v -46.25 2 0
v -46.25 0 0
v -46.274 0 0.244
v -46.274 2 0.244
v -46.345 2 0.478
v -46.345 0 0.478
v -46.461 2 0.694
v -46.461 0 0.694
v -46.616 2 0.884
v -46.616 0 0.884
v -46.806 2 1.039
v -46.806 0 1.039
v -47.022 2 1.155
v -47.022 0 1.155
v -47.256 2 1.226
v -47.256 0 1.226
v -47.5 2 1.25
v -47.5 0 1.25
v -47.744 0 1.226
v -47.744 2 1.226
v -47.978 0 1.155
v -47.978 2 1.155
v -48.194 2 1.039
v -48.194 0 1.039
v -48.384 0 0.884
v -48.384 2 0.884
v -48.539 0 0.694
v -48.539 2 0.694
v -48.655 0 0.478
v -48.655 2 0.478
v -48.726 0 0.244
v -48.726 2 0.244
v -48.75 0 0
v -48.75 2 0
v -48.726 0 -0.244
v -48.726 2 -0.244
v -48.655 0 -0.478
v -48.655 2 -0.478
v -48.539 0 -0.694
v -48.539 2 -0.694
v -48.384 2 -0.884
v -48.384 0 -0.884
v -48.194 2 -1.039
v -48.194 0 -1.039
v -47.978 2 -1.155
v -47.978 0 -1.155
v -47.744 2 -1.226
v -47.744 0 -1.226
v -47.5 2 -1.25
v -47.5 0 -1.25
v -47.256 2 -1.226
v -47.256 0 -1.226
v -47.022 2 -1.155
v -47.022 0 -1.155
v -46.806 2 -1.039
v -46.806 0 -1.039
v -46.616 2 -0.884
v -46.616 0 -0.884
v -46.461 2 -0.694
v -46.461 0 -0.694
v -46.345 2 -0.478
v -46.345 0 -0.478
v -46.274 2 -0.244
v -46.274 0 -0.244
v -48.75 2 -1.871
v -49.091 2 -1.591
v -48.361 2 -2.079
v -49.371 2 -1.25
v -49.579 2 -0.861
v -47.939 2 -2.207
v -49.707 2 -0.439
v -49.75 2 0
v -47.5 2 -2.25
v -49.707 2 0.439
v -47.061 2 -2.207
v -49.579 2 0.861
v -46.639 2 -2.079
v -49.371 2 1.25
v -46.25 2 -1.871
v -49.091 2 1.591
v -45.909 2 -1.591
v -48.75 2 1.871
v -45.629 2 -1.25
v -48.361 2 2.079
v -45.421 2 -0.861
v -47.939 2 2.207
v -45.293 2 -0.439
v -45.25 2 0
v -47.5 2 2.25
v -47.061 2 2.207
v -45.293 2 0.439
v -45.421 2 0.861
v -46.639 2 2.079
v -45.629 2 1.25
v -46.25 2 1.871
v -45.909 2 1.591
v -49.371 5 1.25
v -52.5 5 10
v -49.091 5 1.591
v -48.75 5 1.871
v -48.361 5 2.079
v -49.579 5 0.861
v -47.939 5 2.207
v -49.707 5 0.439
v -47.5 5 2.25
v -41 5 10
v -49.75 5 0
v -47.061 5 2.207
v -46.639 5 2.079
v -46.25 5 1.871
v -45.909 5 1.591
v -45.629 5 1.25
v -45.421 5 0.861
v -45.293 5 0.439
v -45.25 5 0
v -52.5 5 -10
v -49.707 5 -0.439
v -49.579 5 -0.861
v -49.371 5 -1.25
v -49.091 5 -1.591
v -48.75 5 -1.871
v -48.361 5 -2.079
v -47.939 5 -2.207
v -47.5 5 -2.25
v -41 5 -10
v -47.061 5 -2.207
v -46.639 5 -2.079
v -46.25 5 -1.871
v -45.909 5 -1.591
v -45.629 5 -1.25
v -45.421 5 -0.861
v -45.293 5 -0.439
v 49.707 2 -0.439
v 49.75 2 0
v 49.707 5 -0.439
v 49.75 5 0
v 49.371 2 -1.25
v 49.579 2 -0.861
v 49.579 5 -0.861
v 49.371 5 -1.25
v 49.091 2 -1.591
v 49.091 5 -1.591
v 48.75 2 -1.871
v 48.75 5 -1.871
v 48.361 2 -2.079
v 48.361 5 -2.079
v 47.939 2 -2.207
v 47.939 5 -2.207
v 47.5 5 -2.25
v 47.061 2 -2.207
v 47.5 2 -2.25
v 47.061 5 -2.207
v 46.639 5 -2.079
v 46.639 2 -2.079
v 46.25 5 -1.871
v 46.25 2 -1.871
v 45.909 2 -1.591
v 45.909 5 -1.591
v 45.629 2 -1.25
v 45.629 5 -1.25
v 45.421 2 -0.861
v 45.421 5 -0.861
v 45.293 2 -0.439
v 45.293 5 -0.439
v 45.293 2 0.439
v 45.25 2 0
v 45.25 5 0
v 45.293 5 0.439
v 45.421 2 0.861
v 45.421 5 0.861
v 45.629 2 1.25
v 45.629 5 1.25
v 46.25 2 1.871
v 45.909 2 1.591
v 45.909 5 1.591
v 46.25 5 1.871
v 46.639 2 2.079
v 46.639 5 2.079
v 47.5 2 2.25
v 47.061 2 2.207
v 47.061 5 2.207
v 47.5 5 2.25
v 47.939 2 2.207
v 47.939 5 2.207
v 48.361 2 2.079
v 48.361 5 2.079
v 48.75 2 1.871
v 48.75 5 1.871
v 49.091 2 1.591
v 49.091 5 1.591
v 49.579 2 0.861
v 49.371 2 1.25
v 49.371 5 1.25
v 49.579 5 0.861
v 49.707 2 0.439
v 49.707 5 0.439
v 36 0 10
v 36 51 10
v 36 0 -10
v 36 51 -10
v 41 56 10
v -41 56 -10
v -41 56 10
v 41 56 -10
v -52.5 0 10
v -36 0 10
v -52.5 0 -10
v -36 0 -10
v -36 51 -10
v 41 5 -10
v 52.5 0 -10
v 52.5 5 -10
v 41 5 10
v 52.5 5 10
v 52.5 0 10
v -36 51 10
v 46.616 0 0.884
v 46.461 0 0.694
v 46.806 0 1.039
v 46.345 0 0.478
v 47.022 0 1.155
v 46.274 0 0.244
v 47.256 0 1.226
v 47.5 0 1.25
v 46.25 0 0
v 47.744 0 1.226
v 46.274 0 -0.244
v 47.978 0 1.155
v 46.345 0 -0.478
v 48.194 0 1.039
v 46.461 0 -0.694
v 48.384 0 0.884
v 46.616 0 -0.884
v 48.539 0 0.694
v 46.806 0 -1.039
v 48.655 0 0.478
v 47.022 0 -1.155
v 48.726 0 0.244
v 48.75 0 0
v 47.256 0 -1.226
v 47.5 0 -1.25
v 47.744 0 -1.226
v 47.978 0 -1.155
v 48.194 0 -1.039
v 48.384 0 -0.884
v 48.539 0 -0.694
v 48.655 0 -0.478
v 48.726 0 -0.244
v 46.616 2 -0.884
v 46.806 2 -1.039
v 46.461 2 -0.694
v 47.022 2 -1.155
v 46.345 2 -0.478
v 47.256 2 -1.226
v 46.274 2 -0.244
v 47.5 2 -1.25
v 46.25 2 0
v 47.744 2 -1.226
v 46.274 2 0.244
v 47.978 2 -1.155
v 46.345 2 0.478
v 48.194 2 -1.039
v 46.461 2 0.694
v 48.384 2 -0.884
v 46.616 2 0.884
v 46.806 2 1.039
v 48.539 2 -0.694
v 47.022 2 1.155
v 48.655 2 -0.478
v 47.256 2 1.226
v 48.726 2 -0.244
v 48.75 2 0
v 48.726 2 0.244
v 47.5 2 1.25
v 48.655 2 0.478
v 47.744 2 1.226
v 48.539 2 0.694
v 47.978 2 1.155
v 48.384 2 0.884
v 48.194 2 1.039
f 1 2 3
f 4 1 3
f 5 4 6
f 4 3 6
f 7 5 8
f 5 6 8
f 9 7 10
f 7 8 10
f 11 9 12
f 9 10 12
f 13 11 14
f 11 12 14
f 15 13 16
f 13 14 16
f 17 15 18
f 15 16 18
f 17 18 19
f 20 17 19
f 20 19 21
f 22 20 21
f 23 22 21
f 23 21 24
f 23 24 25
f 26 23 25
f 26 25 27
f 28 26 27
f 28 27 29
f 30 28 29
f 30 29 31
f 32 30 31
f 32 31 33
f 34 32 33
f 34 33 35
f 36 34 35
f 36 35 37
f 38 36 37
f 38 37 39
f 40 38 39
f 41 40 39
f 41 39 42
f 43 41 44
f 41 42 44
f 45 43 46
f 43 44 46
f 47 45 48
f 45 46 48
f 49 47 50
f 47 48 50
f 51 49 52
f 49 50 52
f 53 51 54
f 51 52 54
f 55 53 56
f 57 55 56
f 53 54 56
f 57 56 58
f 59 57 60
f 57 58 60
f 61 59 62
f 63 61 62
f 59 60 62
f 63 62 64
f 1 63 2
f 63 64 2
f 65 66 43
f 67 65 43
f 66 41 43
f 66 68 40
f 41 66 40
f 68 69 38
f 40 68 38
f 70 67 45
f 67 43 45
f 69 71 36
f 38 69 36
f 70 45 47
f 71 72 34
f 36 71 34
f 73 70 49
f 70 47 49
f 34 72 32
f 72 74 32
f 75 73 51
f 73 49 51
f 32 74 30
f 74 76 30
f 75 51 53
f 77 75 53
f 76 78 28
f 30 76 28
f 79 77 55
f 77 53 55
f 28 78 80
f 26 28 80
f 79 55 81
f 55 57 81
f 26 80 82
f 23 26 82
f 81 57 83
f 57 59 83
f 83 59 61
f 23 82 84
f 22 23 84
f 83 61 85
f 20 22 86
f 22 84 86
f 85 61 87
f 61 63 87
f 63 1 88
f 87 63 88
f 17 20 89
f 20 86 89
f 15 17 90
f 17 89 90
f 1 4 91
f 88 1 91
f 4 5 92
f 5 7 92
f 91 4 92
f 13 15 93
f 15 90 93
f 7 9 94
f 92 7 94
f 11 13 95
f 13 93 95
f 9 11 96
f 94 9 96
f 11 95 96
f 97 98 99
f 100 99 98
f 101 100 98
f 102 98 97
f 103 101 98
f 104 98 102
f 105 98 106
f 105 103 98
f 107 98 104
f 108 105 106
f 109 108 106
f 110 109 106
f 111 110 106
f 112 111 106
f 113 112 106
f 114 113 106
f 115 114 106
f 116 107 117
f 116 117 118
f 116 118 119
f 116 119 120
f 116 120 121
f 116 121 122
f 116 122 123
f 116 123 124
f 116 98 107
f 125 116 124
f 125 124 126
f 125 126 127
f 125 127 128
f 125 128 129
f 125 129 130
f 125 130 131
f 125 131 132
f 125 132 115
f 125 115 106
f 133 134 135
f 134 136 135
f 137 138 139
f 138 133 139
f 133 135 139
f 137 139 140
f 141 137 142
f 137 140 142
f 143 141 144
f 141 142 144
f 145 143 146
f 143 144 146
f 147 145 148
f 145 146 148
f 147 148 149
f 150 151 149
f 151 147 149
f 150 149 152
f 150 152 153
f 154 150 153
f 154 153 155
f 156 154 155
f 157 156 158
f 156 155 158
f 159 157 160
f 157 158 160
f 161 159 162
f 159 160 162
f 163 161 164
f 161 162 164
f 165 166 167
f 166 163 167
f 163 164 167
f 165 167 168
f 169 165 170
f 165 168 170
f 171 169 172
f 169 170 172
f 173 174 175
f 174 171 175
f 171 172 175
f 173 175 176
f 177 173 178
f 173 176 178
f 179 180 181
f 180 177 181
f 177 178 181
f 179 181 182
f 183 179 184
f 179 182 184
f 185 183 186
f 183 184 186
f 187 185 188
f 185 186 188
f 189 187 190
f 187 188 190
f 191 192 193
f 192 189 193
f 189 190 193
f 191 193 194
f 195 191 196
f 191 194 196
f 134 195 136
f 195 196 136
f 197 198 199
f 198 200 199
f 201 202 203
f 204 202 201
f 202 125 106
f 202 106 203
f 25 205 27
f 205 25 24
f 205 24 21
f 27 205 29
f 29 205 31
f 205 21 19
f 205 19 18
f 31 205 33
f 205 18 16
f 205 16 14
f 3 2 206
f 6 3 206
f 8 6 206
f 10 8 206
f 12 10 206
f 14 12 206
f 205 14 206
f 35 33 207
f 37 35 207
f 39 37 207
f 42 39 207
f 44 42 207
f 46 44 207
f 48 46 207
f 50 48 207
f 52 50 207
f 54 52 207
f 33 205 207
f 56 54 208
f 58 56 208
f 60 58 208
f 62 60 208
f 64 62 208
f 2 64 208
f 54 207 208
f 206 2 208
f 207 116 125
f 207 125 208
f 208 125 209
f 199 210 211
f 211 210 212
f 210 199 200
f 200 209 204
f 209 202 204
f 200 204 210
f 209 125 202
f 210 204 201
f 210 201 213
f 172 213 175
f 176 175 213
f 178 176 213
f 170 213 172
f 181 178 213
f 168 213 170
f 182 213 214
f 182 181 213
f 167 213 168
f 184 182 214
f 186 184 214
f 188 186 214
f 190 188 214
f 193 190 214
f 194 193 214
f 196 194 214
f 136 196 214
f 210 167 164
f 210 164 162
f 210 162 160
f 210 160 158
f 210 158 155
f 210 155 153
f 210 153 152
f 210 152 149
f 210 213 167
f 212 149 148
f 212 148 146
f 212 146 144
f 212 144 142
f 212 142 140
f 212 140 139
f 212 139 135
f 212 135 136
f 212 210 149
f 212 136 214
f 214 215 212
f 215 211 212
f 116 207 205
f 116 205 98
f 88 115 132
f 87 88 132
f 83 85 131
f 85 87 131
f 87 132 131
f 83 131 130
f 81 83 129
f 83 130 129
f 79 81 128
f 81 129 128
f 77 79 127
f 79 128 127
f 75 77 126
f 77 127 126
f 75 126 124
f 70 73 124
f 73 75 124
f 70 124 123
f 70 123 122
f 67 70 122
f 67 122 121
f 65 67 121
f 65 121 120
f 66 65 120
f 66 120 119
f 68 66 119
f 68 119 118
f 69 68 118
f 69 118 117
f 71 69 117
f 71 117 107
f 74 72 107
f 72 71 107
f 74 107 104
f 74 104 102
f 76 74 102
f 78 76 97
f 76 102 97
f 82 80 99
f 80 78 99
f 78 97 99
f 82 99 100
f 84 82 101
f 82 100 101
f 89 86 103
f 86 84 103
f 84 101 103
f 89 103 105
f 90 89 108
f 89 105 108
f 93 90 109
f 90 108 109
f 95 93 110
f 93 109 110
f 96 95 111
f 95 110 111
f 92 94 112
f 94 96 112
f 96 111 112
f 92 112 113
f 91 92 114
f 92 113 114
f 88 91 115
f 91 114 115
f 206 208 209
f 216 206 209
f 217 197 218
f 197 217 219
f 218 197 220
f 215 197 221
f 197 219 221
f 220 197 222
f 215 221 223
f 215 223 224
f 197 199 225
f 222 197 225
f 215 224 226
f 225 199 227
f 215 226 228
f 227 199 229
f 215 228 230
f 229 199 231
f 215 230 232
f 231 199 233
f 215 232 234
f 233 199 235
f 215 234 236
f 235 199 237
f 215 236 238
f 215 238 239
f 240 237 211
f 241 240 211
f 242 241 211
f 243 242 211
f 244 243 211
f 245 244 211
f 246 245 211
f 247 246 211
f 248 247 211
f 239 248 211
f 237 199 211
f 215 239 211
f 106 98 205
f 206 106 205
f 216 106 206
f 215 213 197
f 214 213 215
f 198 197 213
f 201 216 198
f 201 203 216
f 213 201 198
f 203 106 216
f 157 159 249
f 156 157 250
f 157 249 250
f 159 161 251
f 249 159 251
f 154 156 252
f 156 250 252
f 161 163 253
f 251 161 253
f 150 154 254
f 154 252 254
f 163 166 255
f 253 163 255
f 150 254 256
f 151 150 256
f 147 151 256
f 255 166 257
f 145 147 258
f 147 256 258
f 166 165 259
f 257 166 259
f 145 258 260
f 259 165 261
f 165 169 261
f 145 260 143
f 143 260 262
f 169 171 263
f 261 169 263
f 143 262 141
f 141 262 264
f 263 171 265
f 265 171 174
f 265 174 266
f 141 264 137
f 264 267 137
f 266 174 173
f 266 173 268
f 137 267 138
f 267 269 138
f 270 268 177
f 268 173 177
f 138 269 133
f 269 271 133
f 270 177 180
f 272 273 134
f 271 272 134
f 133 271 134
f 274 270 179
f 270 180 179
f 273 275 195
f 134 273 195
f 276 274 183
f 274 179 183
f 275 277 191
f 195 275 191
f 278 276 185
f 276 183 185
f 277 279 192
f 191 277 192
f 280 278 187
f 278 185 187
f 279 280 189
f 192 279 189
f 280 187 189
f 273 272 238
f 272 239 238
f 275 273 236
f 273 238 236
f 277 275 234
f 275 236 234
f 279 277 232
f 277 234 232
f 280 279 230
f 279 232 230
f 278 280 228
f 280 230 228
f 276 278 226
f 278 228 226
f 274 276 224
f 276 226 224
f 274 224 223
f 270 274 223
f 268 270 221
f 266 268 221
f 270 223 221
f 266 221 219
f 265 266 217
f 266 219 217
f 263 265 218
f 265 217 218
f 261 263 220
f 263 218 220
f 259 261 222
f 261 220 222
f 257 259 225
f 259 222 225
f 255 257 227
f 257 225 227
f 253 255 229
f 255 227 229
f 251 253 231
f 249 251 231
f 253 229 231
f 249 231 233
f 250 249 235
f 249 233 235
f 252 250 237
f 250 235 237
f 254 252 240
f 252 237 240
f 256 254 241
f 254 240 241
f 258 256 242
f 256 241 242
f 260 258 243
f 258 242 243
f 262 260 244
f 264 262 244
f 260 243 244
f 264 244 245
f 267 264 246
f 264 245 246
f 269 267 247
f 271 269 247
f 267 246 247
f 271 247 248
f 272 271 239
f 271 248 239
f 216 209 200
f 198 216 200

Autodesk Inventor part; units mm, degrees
ref_plane "YZ Plane" through (0, 0, 0) normal (1, 0, 0) x (0, 1, 0)
ref_plane "XZ Plane" through (0, 0, 0) normal (0, 1, 0) x (-1, 0, 0)
ref_plane "XY Plane" through (0, 0, 0) normal (0, 0, 1) x (1, 0, 0)
sketch "Sketch1" plane through (0, 0, 0) normal (0, 0, 1) x (1, 0, 0)
  line L0 (-52.5, 5) -> (-41, 5)
  line L1 (-41, 5) -> (-41, 56)
  line L2 (-41, 56) -> (41, 56)
  line L3 (41, 56) -> (41, 5)
  line L4 (41, 5) -> (52.5, 5)
  line L5 (-36, 0) -> (-36, 51)
  line L6 (-36, 51) -> (36, 51)
  line L7 (36, 51) -> (36, 0)
  line L8 (0, 0) -> (0, -25.7238) construction
  line L9 (52.5, 0) -> (52.5, 5)
  line L10 (-52.5, 0) -> (-52.5, 5)
  line L11 (-52.5, 0) -> (-36, 0)
  line L12 (36, 0) -> (52.5, 0)
  dimension "d1" = 5
  dimension "d2" = 5
  dimension "d3" = 5
  dimension "d5" = 72
  dimension "d6" = 51
  dimension "d7" = 16.5
  dimension "d8" = 5
extrude "Extrusion1" add sketch "Sketch1" along normal mid plane 20
sketch "Sketch2" plane through (-52.5, 0, 10) normal (0, -1, 0) x (1, 0, 0)
  circle A0 centre (5, -10) radius 1.25
  circle A1 centre (100, -10) radius 1.25
  line L0 (52.5, -10) -> (52.5, 0) construction
  line L1 (16.5, 0) -> (88.5, 0) construction
  circle A2 centre (5, -10) radius 2.25
  circle A3 centre (100, -10) radius 2.25
  dimension "d11" = 2.5
  dimension "d12" = 95
  dimension "d15" = 4.5
extrude "Extrusion2" cut sketch "Sketch2" against normal through all contours A0 | A1
extrude "Extrusion3" cut sketch "Sketch2" along normal blind 3 from surface at -5
equation "\"d1\" = d8"
equation "\"d2\" = d8"
equation "\"d3\" = d8"
properties part number "battery_fix"
